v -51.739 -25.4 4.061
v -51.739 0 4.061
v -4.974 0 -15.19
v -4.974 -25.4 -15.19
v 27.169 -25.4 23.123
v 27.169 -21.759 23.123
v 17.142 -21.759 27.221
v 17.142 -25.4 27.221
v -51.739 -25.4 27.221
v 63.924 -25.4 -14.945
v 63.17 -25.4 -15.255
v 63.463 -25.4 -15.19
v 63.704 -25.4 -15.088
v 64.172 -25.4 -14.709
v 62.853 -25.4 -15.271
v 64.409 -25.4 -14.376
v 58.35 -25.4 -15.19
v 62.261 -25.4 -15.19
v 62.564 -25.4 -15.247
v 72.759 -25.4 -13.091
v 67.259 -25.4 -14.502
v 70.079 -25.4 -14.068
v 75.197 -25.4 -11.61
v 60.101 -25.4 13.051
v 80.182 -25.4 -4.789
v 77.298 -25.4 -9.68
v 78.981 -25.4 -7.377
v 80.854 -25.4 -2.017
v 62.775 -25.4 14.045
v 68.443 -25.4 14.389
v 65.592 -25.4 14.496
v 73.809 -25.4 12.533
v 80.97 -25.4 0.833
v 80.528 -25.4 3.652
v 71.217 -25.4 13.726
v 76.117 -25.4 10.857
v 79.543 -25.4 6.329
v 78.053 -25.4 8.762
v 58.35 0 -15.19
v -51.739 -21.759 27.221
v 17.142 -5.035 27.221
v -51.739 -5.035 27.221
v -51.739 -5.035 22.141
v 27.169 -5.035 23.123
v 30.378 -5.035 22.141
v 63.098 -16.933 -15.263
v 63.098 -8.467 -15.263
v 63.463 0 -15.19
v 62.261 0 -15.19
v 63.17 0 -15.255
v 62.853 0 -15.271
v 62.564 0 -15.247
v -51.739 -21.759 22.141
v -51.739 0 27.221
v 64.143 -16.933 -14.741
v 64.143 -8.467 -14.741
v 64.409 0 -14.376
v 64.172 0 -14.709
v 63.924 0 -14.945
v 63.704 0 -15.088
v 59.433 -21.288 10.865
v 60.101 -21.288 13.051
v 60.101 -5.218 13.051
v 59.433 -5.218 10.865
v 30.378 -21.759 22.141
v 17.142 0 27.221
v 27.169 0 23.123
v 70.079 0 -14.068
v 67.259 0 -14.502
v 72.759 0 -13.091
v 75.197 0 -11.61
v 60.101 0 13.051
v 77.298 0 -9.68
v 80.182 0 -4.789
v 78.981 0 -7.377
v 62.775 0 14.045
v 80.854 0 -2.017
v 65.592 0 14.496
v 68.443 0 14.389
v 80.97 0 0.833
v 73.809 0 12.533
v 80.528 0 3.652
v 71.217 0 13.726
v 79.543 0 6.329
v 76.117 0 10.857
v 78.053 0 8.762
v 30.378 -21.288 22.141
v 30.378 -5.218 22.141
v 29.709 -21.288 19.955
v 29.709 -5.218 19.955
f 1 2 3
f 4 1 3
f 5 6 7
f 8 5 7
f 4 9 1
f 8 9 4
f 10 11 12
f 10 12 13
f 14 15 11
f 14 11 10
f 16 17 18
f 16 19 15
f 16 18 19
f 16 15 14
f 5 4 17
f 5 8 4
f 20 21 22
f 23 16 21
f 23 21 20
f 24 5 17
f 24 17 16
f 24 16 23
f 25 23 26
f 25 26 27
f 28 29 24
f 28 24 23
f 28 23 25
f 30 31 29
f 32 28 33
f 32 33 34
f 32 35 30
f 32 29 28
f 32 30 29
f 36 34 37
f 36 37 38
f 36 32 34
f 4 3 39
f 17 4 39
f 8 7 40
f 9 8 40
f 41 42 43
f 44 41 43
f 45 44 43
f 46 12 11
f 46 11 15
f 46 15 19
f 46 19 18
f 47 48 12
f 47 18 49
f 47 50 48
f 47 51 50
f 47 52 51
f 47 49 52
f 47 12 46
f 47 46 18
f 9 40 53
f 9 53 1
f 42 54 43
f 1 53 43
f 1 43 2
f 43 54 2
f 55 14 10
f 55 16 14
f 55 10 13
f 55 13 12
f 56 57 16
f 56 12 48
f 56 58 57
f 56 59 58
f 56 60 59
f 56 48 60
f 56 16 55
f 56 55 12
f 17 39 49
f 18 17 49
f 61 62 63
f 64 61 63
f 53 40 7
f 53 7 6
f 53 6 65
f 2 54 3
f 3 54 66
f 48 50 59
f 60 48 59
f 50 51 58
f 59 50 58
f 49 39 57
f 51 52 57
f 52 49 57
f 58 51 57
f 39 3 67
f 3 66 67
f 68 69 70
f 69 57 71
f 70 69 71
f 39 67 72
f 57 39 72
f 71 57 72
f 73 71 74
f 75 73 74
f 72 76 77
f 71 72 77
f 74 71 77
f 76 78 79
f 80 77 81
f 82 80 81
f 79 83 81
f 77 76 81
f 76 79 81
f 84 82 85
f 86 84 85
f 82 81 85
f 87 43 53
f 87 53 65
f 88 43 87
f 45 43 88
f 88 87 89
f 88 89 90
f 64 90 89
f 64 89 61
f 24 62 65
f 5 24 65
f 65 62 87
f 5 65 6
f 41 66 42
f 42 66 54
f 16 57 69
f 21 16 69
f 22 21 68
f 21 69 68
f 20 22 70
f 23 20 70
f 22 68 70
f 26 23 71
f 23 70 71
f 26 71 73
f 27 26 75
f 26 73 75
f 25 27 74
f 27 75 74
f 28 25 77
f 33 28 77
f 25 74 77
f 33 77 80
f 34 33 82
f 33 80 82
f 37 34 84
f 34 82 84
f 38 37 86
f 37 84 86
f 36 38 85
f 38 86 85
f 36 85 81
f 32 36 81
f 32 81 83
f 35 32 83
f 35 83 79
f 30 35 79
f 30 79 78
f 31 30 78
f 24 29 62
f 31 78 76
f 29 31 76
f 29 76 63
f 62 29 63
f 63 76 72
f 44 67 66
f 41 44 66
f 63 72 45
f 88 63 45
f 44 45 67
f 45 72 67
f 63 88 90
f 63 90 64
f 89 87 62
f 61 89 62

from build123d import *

# Parameters (mm, degrees)
F1_DEPTH = 25.4
F2_W     = 142.5245404243
F2_H     = 16.7245063931
F3_DEPTH = 5.08
F4_W     = 31.0823179224
F4_H     = 16.0704599693
F5_DEPTH = 2.286


with BuildPart() as f1:
    # F0 (on Front) → F1 (new body)
    with BuildSketch(Plane.XZ):
        with BuildLine():
            Line((17.1419177204, 27.2214487195), (-51.7388731241, 27.2214487195))
            Line((-51.7388731241, 27.2214487195), (-51.7388731241, 4.0606581606))
            Line((-51.7388731241, 4.0606581606), (-4.9744974851, -15.1898686591))
            Line((-4.9744974851, -15.1898686591), (58.3500750363, -15.1898692793))
            Line((58.3500750363, -15.1898692793), (62.2612222636, -15.1898693176))
            Line((62.2612222636, -15.1898693176), (63.4634880032, -15.1898693293))
            add(Edge.make_bspline(
                [(64.4092596529, -14.3758283739), (64.1666311948, -14.7868047997), (63.8535709364, -15.0634684427), (63.4634880032, -15.1898693293)],
                knots=[0.3722656756, 0.3722656756, 0.3722656756, 0.3722656756, 0.4188718953, 0.4188718953, 0.4188718953, 0.4188718953], degree=3))
            add(Edge.make_bspline(
                [(60.1013436317, 13.0514085218), (63.7917100626, 0.7586007856), (66.3472466315, -11.0931674362), (64.4092596529, -14.3758283739)],
                knots=[0, 0, 0, 0, 0.3722656756, 0.3722656756, 0.3722656756, 0.3722656756], degree=3))
            Line((60.1013436317, 13.0514085218), (27.1688286692, 23.1228569478))
            Line((27.1688286692, 23.1228569478), (17.1419177204, 27.2214487195))
        make_face()
        with BuildLine():
            ThreePointArc((64.4092596529, -14.3758283739), (80.818481148, 2.2534544809), (60.1013436317, 13.0514085218))
            add(Edge.make_bspline(
                [(60.1013436317, 13.0514085218), (63.7917100626, 0.7586007856), (66.3472466315, -11.0931674362), (64.4092596529, -14.3758283739)],
                knots=[0, 0, 0, 0, 0.3722656756, 0.3722656756, 0.3722656756, 0.3722656756], degree=3))
        make_face()
        with BuildLine():
            Line((63.4634880032, -15.1898693293), (62.2612222636, -15.1898693176))
            add(Edge.make_bspline(
                [(63.4634880032, -15.1898693293), (63.1173511551, -15.3020301053), (62.7105685577, -15.2958777029), (62.2612222636, -15.1898693176)],
                knots=[0.4188718953, 0.4188718953, 0.4188718953, 0.4188718953, 0.4602275369, 0.4602275369, 0.4602275369, 0.4602275369], degree=3))
        make_face()
    extrude(amount=F1_DEPTH)

    # F2 (on face) → F3 (cut)
    with BuildSketch(Plane.XY.offset(27.2214487195)):
        with Locations((12.0256319642, -13.3969103917)):
            Rectangle(F2_W, F2_H)
    extrude(amount=-F3_DEPTH, mode=Mode.SUBTRACT)

    # F4 (on face) → F5 (cut)
    with BuildSketch(Plane(origin=(8.7903255134, 0, 28.7433856833), x_dir=(0.9562806546, 0, -0.2924505251), z_dir=(0.2924505251, 0, 0.9562806546))):
        with Locations((38.115701994, -13.25293025)):
            Rectangle(F4_W, F4_H)
    extrude(amount=-F5_DEPTH, mode=Mode.SUBTRACT)


solid = f1.part
